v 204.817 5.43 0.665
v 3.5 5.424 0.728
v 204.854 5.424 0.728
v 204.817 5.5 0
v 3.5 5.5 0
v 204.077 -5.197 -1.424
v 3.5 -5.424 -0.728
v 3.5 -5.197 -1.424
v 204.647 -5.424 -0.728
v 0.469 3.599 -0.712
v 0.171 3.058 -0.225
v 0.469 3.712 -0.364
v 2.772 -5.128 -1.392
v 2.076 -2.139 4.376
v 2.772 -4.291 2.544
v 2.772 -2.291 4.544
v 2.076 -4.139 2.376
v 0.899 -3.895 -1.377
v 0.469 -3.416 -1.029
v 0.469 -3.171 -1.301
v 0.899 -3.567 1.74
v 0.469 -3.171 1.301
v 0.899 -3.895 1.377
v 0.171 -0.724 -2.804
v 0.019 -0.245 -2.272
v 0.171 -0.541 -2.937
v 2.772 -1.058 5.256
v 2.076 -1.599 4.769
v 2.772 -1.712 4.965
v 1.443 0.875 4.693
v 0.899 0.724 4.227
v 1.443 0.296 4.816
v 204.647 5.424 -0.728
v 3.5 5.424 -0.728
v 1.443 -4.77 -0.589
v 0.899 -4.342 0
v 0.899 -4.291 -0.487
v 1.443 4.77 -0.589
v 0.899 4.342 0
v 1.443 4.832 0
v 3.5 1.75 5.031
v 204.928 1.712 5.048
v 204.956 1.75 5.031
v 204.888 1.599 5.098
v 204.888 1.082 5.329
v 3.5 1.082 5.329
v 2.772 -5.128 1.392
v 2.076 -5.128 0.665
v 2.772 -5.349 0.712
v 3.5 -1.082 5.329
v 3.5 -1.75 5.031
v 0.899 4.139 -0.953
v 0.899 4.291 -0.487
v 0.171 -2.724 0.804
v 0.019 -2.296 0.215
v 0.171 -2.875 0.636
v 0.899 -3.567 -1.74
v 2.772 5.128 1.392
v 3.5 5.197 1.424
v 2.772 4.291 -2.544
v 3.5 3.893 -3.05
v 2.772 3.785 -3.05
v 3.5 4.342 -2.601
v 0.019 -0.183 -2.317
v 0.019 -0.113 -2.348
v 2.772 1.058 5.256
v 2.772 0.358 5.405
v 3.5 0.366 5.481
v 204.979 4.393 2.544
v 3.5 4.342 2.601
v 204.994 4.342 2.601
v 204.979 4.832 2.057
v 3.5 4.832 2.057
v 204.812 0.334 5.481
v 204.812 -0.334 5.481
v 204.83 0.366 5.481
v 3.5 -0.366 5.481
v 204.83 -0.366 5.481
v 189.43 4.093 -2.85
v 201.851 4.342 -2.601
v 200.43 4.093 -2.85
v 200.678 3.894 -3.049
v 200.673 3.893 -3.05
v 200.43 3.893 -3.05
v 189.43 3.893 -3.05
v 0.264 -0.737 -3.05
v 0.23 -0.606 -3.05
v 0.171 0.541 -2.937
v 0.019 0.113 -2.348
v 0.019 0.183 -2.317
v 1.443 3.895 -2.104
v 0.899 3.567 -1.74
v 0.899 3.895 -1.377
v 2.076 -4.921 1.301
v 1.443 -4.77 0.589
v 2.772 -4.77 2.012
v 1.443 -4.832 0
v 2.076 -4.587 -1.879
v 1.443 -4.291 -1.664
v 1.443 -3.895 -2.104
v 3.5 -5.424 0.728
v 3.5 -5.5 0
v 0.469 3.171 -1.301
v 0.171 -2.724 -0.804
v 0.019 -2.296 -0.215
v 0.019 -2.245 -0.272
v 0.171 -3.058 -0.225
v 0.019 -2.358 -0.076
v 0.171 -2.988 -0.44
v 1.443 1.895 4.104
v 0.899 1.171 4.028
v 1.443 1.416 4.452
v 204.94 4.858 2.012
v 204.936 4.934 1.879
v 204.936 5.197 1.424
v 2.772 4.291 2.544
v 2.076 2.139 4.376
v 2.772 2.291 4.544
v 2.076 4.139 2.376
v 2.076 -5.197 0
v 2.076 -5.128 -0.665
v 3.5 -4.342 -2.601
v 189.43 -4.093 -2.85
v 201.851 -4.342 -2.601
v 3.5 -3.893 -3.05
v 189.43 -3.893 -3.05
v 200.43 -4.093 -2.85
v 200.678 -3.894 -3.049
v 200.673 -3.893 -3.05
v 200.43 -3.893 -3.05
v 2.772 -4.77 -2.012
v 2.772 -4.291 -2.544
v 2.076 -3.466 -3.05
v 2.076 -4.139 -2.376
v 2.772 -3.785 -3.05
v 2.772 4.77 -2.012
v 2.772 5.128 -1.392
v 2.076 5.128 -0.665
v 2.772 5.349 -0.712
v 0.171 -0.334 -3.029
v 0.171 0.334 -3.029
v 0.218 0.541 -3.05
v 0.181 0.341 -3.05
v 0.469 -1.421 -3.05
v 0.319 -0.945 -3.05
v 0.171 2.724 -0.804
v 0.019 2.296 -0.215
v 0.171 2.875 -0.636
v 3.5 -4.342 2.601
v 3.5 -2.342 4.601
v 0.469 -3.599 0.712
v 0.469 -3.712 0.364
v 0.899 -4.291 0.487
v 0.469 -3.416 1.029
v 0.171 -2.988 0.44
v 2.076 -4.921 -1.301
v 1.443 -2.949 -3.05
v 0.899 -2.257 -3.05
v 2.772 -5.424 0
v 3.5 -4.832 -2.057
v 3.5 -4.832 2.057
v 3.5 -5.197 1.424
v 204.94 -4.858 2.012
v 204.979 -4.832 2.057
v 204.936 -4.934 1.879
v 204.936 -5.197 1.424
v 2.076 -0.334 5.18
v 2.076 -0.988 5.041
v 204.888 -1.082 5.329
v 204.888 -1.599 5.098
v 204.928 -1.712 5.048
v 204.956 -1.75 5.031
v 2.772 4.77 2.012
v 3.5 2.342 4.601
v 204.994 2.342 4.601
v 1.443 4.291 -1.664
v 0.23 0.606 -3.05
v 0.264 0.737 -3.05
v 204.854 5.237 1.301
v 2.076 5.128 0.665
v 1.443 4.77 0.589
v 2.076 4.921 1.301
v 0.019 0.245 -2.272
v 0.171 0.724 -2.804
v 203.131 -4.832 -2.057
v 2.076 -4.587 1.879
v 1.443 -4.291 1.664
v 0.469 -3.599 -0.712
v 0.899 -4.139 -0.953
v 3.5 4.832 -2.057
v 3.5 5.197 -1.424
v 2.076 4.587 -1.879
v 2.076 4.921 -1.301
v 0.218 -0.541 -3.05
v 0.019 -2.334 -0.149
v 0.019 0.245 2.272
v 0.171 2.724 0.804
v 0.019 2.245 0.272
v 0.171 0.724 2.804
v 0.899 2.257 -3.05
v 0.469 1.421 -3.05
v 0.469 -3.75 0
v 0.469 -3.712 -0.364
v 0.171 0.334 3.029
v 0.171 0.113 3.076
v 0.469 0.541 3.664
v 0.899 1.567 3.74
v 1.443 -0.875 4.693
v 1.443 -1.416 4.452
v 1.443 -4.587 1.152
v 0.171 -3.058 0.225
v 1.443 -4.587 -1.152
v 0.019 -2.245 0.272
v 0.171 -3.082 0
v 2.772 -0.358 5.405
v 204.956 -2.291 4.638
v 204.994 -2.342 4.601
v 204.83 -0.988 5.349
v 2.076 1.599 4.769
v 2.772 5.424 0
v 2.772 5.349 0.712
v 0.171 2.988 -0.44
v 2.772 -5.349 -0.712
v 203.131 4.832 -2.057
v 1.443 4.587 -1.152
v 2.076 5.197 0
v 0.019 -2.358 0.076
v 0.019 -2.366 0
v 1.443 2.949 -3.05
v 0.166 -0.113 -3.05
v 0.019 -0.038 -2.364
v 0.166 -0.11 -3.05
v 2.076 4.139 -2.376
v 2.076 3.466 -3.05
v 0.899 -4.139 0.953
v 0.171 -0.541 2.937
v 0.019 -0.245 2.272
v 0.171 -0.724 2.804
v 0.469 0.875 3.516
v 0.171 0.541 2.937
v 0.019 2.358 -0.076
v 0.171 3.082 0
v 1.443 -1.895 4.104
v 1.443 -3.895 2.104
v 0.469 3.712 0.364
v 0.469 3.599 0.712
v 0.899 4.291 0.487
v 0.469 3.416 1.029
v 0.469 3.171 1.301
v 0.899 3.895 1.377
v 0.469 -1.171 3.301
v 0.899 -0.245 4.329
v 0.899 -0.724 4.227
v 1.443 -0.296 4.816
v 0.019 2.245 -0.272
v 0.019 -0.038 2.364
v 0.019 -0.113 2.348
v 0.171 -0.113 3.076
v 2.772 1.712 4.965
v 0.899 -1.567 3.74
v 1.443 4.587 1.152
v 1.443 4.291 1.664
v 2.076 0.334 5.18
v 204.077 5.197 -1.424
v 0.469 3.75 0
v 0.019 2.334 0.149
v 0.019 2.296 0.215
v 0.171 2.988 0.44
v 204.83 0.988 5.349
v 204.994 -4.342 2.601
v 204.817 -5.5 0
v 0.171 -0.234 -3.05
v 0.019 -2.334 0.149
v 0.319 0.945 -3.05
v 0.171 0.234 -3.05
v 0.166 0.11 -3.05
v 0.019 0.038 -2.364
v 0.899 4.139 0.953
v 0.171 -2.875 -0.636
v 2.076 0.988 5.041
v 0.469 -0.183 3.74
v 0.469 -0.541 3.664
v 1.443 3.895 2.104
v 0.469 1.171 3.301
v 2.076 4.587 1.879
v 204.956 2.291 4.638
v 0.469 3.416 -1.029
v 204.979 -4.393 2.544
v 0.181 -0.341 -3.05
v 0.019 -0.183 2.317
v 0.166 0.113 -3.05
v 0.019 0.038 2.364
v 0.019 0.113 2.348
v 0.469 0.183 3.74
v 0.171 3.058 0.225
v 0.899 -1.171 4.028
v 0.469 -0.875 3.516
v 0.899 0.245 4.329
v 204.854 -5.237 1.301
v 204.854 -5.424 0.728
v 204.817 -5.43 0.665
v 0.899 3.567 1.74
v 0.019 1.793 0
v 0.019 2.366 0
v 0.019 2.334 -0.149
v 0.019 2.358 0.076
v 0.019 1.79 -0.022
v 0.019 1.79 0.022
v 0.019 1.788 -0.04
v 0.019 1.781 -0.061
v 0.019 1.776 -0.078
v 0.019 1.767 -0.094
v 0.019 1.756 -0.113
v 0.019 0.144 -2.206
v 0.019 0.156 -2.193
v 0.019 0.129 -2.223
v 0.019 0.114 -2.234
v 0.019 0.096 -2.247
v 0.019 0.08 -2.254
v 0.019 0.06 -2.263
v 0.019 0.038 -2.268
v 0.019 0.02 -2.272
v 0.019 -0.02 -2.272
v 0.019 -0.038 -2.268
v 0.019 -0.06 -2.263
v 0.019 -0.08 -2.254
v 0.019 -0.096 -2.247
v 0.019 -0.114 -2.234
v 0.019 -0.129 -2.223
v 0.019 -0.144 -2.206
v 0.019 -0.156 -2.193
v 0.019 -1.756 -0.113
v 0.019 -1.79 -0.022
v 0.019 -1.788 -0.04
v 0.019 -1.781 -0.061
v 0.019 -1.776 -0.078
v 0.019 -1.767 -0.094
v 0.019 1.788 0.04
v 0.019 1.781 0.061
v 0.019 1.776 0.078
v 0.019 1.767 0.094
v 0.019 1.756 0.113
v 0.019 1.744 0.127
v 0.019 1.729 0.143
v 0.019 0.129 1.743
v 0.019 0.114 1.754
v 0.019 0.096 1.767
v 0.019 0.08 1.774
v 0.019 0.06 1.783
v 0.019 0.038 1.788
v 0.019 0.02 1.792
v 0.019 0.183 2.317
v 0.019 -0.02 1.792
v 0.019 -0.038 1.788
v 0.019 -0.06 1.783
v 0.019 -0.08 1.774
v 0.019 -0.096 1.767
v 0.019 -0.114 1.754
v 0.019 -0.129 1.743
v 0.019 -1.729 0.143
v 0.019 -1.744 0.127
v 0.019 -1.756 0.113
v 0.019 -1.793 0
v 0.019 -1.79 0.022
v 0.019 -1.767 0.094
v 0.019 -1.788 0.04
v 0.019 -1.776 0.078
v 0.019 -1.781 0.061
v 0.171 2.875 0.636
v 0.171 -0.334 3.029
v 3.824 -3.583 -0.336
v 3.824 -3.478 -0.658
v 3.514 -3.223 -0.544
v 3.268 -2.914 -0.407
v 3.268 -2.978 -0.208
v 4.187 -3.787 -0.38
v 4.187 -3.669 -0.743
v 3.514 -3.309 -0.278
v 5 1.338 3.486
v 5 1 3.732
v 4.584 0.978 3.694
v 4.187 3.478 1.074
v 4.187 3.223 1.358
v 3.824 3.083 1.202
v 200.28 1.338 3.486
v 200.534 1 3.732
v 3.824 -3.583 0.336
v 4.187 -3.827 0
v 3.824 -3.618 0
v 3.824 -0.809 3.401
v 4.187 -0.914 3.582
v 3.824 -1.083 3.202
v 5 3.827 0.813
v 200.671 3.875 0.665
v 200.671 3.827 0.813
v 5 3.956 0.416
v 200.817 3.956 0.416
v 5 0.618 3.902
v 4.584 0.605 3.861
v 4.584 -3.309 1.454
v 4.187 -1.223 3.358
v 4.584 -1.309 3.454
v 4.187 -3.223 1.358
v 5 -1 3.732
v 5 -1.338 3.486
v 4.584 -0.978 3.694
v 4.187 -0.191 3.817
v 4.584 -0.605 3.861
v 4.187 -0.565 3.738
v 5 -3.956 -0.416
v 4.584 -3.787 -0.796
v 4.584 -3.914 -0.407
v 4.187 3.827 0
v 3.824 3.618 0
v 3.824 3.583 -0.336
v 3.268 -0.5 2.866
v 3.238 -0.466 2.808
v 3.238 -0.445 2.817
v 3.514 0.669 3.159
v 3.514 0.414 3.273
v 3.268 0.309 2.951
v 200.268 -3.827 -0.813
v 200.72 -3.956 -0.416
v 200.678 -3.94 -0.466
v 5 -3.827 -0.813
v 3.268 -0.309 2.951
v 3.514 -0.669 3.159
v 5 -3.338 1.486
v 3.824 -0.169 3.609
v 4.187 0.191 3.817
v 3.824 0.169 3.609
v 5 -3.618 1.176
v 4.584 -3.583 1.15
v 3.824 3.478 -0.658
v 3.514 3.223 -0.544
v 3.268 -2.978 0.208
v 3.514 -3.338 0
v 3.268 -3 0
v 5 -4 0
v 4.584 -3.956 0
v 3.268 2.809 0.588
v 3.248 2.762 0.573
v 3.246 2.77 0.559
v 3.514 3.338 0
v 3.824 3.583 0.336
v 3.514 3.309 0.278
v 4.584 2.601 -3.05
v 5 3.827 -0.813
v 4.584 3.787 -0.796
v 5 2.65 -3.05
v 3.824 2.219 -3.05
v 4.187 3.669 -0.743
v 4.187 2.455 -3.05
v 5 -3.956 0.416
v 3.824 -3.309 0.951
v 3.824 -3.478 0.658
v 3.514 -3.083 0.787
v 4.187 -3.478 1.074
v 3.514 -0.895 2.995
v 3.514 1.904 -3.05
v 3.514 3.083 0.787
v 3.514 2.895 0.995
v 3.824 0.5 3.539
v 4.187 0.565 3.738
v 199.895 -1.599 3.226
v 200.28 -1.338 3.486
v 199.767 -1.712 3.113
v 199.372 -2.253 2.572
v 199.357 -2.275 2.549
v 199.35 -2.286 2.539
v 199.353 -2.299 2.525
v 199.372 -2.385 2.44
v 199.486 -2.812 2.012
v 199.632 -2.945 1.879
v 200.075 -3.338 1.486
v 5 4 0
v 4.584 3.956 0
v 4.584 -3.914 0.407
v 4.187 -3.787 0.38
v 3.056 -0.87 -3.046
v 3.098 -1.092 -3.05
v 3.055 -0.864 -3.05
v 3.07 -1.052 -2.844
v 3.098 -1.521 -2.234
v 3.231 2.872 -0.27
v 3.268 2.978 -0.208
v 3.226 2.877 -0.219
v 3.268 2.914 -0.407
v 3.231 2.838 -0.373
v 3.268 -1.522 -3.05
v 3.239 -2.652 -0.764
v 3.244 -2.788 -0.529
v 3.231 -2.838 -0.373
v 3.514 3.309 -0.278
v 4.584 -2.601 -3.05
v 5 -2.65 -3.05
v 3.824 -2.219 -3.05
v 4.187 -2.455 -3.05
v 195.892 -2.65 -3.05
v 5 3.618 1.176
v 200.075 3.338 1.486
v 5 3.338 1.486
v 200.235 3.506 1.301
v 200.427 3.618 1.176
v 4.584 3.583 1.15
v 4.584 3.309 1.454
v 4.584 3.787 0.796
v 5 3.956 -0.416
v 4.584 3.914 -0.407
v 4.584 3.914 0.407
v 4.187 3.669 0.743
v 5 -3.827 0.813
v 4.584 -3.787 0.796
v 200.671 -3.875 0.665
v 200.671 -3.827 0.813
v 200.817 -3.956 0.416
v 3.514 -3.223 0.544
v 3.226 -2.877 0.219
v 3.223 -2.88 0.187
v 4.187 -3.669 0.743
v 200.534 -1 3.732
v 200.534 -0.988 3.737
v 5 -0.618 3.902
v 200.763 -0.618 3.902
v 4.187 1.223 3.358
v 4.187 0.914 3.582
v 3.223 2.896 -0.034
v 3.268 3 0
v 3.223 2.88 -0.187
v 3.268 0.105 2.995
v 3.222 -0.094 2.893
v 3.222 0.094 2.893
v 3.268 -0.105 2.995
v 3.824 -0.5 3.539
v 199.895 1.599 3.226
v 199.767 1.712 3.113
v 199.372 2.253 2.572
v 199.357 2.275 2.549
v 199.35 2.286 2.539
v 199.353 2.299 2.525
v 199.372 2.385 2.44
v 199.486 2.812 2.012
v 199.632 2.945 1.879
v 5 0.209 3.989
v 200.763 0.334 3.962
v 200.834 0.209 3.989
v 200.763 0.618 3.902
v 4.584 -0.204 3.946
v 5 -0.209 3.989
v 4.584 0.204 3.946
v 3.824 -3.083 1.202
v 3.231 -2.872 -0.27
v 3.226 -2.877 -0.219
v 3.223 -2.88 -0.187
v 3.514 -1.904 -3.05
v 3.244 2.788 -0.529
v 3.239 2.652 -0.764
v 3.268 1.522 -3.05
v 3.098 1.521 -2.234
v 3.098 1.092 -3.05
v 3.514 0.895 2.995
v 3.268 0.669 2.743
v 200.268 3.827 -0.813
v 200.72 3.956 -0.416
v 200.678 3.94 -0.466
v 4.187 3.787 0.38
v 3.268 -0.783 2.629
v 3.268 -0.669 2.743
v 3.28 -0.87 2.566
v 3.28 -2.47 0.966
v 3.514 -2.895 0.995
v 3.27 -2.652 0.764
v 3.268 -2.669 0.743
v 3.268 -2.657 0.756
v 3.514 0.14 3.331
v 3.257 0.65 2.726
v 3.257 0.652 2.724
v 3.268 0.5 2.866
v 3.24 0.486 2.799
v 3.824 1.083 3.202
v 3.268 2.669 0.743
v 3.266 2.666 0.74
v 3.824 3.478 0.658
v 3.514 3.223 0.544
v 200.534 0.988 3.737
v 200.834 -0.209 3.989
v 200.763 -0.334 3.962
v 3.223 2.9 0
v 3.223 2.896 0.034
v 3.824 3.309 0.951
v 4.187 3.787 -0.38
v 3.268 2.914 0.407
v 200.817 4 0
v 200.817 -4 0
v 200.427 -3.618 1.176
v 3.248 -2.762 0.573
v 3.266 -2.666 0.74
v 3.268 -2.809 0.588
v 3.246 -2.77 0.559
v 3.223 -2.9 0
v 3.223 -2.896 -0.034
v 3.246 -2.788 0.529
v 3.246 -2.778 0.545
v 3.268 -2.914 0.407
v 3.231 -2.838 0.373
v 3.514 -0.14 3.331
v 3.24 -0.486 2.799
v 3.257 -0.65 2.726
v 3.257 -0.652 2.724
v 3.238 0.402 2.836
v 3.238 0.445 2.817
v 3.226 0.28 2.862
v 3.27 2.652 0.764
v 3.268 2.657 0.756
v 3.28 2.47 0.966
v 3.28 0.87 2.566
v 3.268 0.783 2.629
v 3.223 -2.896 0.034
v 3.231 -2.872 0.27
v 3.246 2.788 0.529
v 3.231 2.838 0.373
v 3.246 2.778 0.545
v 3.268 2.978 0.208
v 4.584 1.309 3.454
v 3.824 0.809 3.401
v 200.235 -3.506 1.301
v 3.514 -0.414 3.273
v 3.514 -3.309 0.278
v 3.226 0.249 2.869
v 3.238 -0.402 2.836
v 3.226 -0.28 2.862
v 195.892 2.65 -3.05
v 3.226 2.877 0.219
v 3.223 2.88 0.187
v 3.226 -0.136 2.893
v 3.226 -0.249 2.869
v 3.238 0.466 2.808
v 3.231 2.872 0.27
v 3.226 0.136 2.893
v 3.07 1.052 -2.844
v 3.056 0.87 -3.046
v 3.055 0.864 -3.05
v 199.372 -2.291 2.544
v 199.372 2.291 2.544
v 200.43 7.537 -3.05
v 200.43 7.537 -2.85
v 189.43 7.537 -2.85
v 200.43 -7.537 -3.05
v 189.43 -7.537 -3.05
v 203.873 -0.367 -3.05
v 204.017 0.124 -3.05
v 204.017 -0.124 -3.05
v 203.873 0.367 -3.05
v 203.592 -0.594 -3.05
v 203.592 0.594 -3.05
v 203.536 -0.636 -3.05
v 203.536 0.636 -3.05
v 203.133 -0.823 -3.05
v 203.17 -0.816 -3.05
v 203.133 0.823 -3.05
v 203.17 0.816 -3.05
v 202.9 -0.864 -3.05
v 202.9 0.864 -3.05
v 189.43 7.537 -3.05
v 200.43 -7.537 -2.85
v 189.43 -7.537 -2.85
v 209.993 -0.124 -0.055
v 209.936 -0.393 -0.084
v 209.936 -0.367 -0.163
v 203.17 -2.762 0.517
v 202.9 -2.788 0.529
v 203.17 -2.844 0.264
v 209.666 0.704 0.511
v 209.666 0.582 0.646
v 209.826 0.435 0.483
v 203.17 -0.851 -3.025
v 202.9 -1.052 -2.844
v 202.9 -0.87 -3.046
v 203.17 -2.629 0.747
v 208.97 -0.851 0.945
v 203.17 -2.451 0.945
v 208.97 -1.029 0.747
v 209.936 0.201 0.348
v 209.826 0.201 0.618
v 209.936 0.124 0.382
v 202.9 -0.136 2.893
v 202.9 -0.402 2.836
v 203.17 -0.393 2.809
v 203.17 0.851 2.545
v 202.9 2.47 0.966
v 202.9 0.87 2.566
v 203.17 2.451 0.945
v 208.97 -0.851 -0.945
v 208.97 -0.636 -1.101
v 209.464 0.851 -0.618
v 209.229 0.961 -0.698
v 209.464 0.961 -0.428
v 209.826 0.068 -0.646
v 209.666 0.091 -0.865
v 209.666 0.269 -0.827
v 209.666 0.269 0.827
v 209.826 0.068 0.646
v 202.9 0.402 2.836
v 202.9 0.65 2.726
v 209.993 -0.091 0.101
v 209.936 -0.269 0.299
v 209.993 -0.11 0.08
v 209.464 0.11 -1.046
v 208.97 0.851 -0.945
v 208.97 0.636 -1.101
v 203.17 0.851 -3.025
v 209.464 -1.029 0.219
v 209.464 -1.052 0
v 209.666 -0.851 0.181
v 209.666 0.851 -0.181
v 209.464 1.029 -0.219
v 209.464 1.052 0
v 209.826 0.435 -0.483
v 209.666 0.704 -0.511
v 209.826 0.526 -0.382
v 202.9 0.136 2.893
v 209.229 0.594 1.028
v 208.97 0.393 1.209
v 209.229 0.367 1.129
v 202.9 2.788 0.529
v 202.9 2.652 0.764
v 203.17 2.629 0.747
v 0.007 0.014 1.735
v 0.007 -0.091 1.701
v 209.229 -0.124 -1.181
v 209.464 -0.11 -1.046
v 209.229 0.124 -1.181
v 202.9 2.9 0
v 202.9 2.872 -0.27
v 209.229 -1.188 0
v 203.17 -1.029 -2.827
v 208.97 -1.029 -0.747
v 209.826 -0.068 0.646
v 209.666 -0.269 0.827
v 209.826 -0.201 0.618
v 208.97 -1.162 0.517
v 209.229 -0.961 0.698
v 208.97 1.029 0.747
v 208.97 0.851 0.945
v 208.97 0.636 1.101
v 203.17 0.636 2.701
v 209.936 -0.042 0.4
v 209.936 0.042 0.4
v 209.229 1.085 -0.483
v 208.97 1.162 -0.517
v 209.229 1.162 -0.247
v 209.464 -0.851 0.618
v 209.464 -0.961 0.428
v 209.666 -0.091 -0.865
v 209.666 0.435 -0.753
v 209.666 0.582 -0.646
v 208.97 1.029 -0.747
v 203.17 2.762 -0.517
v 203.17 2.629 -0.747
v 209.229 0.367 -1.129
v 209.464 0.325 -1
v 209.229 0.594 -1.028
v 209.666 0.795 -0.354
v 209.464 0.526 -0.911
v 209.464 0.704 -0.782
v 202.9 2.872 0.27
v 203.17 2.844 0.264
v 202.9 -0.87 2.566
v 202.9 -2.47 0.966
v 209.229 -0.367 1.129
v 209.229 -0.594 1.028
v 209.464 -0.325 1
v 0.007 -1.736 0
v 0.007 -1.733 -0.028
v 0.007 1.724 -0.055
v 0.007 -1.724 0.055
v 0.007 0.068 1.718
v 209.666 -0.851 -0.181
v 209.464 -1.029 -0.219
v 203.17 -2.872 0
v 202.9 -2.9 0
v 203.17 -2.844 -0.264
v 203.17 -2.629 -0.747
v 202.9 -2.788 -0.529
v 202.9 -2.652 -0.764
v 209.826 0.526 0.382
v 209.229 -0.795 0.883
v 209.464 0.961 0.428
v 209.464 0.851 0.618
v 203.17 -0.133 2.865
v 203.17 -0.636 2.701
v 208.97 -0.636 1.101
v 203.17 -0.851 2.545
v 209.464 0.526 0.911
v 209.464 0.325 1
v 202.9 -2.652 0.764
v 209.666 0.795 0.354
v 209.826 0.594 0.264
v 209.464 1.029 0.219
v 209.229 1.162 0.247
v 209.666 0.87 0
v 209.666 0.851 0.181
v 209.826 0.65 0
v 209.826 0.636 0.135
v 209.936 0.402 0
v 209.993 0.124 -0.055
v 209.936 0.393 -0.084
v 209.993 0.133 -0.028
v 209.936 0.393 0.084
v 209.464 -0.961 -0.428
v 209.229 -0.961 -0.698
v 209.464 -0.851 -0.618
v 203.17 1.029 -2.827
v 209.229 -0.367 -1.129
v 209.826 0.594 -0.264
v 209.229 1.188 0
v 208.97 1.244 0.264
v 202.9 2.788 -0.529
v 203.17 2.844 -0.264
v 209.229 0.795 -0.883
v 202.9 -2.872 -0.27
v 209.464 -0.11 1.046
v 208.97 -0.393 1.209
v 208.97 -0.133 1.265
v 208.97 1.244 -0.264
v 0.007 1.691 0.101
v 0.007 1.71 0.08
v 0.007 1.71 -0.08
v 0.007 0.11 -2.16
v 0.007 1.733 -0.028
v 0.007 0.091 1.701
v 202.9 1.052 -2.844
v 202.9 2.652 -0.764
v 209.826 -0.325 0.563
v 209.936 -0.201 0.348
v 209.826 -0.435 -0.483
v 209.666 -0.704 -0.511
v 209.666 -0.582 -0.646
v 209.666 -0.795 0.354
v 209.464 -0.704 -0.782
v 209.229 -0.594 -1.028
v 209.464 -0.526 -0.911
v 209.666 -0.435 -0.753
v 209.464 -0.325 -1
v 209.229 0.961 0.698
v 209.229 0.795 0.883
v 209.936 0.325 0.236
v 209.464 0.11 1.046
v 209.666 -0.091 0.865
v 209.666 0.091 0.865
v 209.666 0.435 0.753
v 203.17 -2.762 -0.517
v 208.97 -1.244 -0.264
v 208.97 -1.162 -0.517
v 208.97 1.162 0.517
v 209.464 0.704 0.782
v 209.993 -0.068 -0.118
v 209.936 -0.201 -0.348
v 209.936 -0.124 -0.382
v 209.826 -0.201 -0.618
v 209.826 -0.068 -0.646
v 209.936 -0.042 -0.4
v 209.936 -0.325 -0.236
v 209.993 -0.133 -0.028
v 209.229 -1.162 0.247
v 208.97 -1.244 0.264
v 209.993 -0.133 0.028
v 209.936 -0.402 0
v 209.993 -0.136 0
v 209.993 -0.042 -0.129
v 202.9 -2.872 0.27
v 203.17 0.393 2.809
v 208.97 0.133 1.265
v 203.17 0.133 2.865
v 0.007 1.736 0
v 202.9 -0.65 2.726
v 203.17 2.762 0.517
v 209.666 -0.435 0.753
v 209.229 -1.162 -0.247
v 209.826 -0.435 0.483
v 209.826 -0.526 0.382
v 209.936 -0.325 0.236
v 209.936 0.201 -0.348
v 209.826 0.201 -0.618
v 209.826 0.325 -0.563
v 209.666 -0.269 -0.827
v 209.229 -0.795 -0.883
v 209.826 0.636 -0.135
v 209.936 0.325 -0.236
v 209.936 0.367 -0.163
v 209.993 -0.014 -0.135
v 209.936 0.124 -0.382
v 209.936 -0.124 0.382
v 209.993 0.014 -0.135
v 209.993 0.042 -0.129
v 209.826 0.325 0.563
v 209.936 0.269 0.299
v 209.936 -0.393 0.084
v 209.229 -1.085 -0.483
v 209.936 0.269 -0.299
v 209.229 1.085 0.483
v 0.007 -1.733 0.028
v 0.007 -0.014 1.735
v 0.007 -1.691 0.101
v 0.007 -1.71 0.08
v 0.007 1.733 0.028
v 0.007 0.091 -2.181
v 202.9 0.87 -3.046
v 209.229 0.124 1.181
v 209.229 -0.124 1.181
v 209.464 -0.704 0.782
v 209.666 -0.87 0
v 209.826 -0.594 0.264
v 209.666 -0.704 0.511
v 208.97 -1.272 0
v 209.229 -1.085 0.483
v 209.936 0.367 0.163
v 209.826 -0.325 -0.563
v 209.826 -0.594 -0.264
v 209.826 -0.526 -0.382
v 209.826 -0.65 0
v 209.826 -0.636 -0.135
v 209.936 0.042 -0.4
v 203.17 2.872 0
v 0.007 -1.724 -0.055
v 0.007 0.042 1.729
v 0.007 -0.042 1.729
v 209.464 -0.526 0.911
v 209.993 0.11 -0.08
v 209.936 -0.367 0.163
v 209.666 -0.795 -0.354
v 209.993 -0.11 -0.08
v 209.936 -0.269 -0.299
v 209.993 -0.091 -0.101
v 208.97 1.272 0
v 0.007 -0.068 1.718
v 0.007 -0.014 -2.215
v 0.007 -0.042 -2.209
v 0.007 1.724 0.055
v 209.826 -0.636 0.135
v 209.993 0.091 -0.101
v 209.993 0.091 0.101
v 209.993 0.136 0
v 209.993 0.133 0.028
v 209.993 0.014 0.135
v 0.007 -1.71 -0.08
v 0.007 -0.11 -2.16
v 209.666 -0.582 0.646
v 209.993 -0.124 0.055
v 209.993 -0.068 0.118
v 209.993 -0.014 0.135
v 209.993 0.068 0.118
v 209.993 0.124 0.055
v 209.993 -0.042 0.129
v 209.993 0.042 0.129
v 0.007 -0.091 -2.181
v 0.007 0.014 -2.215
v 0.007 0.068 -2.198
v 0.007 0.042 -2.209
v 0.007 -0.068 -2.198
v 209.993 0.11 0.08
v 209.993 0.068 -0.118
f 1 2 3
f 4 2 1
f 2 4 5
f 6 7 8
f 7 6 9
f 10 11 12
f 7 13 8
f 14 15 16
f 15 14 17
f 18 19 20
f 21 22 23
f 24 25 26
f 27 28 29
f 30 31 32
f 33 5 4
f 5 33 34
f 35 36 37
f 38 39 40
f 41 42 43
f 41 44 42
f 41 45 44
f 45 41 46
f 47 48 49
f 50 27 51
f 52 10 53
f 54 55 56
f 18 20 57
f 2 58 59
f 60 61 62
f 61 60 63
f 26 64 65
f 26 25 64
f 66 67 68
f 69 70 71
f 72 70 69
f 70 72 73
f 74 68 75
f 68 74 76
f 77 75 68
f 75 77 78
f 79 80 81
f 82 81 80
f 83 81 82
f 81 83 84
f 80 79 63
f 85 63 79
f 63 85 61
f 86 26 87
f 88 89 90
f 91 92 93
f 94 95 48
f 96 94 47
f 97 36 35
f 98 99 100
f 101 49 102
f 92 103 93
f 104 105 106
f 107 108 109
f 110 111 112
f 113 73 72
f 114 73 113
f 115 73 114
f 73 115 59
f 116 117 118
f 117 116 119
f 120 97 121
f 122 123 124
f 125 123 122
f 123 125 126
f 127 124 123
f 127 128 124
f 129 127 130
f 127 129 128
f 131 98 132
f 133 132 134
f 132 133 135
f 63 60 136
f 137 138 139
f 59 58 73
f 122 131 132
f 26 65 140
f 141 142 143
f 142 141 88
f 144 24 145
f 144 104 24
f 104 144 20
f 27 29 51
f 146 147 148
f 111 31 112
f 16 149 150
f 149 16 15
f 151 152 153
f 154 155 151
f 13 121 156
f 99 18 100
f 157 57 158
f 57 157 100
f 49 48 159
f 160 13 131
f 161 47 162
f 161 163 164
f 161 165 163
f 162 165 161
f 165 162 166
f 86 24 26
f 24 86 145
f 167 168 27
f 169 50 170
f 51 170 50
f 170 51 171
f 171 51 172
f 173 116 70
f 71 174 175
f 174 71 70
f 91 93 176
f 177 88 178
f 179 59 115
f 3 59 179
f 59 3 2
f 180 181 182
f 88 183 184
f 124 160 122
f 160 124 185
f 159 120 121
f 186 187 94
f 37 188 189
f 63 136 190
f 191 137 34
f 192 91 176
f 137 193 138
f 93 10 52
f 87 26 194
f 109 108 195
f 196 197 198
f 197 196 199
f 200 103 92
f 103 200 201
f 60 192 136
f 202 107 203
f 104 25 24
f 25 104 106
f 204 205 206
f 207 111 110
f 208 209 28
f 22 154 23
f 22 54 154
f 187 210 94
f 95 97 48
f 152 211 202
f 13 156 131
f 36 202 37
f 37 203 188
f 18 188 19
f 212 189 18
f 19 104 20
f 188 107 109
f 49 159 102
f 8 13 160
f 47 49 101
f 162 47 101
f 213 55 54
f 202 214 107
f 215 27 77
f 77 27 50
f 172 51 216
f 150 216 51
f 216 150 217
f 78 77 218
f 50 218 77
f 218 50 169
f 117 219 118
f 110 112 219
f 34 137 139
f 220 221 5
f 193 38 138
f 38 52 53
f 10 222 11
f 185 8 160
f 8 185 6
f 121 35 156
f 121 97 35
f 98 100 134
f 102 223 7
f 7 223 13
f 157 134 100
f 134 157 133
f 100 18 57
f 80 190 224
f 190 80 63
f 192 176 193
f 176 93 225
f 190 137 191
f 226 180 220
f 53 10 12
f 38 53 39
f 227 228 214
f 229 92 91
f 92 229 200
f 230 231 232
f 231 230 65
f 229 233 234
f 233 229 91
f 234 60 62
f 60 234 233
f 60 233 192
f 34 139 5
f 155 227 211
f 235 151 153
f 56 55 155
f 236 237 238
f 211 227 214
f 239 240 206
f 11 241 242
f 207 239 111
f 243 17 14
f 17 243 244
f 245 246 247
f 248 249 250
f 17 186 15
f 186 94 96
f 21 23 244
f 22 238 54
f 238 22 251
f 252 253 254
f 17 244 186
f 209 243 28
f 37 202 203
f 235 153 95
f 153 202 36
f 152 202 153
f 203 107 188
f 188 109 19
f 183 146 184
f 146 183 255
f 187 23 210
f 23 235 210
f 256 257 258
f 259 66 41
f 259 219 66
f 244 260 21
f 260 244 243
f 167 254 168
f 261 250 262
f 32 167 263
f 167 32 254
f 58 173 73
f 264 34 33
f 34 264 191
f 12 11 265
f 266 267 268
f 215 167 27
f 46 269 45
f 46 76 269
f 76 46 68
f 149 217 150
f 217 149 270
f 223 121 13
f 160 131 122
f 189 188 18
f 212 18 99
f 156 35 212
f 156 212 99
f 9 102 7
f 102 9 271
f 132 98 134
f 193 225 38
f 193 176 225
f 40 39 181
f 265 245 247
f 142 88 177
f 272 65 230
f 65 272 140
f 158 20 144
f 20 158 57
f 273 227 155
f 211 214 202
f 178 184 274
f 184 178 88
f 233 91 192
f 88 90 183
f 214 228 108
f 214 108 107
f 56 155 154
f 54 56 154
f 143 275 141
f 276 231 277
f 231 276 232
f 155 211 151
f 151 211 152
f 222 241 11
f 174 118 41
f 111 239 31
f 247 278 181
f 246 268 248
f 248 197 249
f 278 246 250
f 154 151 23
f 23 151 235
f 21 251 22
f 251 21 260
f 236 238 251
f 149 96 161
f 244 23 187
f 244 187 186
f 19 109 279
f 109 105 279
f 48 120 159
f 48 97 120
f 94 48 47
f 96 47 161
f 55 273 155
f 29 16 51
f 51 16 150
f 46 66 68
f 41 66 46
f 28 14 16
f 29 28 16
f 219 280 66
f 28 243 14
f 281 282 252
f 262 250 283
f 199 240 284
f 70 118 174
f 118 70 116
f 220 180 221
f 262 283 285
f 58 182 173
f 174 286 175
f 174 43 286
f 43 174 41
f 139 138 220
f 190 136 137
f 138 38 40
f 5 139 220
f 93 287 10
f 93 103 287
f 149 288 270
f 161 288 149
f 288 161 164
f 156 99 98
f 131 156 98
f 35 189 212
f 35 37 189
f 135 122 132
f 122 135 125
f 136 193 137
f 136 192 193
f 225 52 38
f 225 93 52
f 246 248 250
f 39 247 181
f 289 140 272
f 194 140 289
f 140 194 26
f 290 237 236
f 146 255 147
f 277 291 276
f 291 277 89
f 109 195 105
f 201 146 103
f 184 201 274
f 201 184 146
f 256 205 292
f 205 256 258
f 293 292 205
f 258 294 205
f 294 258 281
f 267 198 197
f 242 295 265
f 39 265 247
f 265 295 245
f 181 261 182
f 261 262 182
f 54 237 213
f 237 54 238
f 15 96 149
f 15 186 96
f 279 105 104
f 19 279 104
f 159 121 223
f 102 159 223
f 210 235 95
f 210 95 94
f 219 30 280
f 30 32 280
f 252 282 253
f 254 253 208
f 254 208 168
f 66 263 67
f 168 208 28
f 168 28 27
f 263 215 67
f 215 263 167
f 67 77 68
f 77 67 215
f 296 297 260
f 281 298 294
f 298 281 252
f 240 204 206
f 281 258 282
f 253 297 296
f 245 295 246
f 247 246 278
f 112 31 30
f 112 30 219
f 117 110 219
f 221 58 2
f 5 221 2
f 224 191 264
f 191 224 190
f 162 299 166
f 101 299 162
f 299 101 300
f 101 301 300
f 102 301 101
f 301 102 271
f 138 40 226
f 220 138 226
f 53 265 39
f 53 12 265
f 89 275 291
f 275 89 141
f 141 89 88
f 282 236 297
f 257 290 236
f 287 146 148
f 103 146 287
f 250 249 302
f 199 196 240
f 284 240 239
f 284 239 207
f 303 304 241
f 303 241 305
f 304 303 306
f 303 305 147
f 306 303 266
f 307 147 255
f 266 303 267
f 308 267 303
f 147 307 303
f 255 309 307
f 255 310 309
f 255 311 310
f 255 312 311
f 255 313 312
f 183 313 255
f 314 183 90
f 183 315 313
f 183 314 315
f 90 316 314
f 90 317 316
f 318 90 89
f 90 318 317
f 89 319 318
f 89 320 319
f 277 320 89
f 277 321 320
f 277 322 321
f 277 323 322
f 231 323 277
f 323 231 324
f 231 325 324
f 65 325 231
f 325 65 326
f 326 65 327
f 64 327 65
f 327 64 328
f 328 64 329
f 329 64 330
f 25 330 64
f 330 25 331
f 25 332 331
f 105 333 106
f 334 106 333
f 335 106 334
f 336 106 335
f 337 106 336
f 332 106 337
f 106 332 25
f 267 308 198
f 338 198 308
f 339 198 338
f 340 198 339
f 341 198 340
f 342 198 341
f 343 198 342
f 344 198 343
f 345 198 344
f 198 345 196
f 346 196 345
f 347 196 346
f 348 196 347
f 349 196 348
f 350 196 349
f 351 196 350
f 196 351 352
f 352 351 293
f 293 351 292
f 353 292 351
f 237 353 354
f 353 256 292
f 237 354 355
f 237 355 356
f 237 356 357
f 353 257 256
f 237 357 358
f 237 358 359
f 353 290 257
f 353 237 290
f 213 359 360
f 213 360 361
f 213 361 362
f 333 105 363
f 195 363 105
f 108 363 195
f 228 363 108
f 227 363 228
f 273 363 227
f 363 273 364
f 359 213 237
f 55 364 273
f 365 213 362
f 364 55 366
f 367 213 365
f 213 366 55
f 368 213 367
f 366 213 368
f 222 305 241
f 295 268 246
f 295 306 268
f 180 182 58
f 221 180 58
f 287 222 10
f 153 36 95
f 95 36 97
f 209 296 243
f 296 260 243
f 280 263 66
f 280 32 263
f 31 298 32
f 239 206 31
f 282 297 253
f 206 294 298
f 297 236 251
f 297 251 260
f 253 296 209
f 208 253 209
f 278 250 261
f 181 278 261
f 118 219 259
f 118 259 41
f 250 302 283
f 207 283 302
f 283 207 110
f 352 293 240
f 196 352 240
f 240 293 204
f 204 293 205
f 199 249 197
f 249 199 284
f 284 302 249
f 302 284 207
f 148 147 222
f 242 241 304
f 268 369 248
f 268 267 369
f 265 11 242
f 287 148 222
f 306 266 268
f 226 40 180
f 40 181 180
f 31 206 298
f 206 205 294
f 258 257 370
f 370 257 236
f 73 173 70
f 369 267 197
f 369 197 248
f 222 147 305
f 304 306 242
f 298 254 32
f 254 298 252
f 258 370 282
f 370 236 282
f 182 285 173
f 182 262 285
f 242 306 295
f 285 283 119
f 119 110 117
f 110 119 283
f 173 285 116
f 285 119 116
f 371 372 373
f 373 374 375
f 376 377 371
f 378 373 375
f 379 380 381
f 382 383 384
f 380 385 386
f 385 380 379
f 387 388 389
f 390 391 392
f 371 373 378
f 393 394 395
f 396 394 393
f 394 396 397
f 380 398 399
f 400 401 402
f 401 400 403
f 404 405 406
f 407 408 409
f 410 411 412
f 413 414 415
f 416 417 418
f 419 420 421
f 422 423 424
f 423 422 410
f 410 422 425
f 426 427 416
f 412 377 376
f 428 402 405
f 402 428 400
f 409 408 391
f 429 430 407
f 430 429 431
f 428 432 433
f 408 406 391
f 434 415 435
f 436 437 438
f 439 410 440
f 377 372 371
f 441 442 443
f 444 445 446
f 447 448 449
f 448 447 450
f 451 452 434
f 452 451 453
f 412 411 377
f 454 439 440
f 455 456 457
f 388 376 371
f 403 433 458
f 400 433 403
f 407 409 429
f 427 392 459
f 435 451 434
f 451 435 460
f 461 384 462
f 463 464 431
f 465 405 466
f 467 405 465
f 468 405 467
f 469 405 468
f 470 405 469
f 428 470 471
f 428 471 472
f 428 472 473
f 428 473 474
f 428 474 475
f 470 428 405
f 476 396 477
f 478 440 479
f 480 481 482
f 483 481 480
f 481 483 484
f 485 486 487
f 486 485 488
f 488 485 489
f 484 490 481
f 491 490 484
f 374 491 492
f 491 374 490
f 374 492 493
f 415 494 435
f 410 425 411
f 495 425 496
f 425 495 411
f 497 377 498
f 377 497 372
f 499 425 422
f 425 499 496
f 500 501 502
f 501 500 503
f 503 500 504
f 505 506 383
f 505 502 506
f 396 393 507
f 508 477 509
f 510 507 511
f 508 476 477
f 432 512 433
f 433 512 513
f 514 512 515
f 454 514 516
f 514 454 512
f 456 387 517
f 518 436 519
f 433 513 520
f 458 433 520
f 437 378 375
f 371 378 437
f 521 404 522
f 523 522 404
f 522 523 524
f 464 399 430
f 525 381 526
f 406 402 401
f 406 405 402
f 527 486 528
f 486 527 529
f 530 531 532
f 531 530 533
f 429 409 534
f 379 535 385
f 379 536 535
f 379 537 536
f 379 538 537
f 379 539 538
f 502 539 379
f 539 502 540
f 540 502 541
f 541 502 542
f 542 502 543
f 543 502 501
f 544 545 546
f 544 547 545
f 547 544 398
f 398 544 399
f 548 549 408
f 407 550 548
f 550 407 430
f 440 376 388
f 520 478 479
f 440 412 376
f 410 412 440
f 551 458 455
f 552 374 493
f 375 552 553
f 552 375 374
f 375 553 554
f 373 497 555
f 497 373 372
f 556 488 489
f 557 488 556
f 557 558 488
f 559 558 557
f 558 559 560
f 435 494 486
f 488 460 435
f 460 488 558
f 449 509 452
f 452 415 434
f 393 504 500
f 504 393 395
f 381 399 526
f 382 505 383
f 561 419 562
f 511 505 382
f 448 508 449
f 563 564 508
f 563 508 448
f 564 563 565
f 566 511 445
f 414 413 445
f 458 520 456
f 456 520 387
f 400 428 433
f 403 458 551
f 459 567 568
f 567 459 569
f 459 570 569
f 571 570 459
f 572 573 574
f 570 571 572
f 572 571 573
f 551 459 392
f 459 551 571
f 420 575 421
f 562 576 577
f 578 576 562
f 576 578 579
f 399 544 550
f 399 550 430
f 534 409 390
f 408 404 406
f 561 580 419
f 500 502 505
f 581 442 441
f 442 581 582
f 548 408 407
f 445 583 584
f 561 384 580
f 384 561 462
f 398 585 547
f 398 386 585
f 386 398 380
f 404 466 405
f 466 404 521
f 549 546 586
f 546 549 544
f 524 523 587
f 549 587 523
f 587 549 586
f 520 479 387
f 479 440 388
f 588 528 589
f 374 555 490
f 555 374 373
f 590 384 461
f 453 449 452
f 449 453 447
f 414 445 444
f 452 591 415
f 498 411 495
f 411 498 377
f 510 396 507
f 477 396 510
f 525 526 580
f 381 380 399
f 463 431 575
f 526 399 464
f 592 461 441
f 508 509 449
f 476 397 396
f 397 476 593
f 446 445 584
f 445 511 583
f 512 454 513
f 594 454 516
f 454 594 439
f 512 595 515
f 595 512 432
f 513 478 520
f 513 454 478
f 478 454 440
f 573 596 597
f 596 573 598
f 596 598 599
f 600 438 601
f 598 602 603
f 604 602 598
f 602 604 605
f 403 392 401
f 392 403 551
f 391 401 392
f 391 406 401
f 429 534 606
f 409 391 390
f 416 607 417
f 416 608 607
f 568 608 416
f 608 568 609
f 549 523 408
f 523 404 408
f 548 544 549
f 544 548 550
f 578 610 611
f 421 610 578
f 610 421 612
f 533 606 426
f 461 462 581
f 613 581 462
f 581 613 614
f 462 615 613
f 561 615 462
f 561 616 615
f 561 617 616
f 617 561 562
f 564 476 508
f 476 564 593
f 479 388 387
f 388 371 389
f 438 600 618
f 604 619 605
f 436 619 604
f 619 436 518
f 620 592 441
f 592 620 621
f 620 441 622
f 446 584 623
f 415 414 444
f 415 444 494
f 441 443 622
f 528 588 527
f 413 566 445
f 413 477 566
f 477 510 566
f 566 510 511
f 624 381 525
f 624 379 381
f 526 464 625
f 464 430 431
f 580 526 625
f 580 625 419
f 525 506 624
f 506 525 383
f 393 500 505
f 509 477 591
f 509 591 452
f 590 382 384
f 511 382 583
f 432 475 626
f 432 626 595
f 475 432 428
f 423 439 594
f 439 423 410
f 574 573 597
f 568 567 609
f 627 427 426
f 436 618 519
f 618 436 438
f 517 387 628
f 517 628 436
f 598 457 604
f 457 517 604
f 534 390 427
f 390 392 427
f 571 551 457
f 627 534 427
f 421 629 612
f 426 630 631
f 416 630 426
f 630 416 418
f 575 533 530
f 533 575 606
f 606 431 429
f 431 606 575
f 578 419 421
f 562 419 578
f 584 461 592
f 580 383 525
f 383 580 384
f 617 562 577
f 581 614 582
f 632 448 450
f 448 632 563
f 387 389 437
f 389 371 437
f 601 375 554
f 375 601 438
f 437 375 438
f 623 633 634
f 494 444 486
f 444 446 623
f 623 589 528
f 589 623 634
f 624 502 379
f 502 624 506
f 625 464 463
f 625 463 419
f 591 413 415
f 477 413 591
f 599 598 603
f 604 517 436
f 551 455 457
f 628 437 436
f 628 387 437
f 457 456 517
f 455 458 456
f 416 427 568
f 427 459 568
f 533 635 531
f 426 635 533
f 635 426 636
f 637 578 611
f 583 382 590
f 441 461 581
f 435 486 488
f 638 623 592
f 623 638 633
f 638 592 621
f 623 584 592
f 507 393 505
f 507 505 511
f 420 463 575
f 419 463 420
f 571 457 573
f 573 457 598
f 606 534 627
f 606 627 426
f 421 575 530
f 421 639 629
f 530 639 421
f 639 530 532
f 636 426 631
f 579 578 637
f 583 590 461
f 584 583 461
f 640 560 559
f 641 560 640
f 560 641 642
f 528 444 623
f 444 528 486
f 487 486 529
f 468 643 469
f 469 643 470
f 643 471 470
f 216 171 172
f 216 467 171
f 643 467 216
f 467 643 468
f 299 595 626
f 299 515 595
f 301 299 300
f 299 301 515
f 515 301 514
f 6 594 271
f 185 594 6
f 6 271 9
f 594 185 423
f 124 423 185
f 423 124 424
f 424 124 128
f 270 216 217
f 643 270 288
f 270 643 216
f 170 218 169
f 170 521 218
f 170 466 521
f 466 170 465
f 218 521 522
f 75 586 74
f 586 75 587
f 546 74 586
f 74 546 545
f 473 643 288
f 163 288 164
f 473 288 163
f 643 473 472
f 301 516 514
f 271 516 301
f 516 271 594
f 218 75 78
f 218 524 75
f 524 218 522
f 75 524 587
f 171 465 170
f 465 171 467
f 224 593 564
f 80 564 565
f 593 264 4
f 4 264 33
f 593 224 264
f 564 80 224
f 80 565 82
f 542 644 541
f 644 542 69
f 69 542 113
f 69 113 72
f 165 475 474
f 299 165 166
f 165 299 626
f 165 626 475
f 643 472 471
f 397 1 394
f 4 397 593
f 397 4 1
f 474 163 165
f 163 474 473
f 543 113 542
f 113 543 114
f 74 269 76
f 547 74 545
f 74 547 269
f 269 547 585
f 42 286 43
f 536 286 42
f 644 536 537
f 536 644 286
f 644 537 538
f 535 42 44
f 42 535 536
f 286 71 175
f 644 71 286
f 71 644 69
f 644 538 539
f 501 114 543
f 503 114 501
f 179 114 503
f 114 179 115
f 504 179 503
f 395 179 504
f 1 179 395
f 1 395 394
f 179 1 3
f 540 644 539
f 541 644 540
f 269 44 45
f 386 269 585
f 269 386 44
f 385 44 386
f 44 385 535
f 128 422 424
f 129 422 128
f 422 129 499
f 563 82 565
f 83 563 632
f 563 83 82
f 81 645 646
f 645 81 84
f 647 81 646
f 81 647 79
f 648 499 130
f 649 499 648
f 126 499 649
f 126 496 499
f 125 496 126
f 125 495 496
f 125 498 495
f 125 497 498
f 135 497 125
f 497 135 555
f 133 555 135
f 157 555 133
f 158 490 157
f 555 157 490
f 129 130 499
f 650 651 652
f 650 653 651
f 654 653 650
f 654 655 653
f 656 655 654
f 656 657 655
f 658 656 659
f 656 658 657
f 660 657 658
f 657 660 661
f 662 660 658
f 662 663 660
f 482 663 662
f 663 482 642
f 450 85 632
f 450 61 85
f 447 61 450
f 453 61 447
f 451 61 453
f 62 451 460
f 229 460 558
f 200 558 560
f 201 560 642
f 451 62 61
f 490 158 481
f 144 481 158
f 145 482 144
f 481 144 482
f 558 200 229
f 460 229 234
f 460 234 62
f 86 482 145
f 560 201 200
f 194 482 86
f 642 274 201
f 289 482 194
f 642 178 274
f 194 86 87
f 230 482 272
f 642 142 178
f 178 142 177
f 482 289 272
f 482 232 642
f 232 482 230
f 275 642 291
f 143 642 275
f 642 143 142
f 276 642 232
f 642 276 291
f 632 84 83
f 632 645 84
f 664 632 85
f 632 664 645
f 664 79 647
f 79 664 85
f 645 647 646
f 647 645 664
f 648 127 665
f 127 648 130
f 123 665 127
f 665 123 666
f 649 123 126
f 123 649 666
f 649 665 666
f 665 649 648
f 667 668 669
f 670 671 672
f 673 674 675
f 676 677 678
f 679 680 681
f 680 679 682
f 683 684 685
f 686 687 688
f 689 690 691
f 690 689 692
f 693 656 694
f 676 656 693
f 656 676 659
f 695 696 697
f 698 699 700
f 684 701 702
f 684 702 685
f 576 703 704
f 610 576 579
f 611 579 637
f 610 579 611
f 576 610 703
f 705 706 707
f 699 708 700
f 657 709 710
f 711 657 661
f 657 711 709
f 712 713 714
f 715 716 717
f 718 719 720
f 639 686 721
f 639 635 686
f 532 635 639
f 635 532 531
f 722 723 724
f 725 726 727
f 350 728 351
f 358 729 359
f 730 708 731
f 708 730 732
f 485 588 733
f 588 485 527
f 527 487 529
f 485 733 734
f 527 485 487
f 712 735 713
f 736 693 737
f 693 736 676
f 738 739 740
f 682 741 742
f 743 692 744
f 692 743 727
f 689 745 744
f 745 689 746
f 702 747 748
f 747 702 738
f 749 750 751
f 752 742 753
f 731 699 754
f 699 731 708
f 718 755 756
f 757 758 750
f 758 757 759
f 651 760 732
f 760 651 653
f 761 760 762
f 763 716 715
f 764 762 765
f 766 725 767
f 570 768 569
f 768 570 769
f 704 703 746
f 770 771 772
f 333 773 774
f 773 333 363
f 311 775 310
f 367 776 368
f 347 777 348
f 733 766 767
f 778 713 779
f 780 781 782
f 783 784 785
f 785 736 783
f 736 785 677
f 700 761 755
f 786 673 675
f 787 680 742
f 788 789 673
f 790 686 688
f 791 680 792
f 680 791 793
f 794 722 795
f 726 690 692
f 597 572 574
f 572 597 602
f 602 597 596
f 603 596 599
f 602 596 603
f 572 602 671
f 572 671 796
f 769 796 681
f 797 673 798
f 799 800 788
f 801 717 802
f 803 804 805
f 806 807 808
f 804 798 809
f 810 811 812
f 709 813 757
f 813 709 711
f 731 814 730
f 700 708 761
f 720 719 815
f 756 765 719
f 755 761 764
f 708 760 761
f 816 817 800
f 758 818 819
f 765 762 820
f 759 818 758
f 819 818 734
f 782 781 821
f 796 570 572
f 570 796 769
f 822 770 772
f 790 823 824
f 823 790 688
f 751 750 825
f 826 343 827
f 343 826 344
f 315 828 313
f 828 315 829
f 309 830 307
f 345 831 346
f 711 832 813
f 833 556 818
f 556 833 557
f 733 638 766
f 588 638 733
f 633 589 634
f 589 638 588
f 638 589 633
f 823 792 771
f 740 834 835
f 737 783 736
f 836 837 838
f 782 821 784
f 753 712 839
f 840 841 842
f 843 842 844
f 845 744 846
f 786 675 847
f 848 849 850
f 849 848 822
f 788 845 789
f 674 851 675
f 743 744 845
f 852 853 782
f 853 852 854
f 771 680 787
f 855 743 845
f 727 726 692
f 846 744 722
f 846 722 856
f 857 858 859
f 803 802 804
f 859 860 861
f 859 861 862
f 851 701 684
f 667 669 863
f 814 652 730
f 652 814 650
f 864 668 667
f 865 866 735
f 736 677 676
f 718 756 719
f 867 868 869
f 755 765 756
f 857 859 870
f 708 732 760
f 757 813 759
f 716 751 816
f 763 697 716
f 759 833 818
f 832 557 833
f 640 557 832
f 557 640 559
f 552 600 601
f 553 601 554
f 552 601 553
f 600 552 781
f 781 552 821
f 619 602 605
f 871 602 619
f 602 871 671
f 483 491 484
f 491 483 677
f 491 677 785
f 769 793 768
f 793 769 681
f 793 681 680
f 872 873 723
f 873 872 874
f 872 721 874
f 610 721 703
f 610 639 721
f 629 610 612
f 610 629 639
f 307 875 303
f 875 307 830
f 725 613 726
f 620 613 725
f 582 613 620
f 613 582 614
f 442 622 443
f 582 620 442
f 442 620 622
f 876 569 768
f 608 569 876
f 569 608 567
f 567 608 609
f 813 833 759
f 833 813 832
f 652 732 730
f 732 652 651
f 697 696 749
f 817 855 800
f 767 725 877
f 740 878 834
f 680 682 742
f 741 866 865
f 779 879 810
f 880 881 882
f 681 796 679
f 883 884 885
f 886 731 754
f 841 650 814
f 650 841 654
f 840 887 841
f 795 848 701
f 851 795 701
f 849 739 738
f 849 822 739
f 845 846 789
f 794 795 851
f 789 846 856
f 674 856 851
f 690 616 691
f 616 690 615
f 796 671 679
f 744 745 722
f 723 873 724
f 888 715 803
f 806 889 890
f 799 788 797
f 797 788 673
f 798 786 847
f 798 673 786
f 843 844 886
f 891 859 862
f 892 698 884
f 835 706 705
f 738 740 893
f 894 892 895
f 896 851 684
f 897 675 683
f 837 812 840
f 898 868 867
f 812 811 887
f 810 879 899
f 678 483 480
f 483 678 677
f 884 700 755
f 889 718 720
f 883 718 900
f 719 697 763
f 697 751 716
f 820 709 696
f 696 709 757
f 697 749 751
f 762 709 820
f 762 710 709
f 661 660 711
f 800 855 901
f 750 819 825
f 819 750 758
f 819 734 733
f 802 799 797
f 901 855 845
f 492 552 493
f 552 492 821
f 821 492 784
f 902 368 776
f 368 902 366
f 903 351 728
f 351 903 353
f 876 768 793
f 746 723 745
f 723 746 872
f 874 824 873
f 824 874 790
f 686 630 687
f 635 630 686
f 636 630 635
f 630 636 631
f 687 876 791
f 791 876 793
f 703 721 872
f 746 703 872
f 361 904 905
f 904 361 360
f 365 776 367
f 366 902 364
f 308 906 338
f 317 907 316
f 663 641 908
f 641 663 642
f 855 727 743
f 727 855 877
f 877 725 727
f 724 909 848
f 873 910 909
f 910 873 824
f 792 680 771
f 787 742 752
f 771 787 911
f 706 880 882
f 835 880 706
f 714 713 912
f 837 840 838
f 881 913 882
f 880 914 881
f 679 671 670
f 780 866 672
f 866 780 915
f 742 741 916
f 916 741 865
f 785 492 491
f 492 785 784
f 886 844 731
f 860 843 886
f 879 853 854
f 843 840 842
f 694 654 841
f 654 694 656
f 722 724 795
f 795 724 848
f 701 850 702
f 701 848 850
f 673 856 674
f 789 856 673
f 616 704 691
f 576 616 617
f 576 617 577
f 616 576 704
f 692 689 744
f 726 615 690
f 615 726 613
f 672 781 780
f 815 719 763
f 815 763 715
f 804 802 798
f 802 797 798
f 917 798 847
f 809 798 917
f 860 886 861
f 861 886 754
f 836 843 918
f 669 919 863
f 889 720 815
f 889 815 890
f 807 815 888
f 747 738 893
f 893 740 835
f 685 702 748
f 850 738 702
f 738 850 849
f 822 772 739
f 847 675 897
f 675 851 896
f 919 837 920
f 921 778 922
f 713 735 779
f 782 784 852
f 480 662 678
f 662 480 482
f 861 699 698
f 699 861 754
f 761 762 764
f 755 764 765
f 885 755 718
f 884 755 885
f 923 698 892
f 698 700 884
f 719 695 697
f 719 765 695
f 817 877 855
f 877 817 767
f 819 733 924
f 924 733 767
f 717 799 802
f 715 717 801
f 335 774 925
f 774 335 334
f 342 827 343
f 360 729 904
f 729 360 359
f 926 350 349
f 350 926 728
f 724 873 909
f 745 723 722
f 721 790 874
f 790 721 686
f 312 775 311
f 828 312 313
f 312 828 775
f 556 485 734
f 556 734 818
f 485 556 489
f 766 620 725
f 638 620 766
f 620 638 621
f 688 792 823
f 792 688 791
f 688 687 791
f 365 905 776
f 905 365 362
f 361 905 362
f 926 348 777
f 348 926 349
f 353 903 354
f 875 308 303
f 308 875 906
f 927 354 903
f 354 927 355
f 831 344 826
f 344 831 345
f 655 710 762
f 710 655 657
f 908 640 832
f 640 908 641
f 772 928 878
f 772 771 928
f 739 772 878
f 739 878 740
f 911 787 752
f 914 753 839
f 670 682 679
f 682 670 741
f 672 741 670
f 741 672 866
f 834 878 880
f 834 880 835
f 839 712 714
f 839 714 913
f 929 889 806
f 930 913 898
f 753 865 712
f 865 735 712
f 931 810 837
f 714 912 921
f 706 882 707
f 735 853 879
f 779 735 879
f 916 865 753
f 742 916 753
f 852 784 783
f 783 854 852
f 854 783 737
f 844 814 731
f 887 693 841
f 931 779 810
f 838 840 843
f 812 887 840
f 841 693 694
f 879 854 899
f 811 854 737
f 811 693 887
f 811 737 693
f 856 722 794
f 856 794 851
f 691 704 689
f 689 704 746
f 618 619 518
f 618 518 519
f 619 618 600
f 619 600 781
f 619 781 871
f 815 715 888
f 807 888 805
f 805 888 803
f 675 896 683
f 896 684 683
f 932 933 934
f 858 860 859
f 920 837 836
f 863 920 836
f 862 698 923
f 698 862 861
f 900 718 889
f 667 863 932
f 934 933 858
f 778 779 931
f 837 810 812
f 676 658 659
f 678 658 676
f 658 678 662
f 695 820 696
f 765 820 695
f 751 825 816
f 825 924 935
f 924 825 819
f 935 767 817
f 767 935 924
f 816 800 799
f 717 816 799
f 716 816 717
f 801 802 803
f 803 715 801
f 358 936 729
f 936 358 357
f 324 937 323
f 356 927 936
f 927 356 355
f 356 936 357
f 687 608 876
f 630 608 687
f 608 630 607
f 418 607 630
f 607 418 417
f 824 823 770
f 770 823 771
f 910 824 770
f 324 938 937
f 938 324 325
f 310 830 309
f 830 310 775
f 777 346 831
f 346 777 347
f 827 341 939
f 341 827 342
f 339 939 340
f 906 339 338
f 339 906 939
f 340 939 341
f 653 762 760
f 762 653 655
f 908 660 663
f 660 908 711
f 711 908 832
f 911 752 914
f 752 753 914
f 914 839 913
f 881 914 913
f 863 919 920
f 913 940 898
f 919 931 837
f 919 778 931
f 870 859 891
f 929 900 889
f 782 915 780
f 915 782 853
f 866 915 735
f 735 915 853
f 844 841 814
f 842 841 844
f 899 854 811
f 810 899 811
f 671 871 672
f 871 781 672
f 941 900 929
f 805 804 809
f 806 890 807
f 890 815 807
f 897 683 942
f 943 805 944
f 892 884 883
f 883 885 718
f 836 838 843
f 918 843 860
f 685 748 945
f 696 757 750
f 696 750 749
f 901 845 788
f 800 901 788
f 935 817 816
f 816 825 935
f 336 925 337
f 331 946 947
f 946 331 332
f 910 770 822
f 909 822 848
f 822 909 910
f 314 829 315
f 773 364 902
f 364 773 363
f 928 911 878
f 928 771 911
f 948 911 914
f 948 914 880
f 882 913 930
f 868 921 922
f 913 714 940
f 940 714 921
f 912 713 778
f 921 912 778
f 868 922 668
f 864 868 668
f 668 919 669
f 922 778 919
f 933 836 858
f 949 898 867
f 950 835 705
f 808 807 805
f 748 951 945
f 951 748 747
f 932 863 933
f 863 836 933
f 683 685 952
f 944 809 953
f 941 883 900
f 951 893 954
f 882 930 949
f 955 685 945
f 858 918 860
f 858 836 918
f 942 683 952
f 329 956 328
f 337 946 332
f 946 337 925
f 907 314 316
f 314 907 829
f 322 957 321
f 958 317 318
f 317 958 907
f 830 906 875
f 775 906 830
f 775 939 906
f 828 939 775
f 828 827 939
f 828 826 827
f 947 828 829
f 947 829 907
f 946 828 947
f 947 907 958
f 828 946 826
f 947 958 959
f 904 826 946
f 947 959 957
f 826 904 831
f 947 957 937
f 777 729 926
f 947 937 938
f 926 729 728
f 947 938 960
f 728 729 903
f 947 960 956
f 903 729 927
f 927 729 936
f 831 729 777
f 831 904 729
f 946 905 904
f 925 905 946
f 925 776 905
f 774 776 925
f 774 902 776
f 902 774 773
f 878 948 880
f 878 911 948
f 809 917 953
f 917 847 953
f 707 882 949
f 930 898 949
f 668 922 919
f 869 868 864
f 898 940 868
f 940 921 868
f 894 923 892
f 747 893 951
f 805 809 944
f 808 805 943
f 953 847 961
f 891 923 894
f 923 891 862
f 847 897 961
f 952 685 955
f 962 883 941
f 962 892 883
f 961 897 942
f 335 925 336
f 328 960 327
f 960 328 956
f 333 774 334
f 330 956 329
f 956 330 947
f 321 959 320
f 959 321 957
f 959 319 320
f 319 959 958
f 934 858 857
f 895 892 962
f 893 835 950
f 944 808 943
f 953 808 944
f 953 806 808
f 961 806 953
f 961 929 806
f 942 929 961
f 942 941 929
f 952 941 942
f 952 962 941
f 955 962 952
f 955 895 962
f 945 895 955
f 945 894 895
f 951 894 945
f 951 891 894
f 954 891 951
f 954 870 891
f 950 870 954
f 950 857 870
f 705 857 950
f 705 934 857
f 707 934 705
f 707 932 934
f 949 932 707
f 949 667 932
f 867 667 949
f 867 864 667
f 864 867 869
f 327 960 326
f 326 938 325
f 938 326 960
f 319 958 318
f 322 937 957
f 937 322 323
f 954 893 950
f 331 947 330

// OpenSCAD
/*

Esto hay que imprimirlo con material de soporte
Está pensado así!

*/

module square_rod(length, width, point, skew = 0) {
    height = length - point;
    union() {
        linear_extrude(height = height)
            polygon(points = [[width, 0], [0, width], [-width, 0], [0, (1 + skew)*(-width)]]);
        translate([0, 0, height])
            linear_extrude(height = point, scale = 0)
                polygon(points = [[width, 0], [0, width], [-width, 0], [0, (1 + skew)*(-width)]]);
    }
}

module rod(length, width, radius, point = 0, skew = 0) {
    w = width/2 - radius;
    
    translate([radius, 0, 0]) 
    rotate([0, 0, 90])
    rotate([90, 0, 0])
    minkowski() {
        sphere(r = radius, $fn = 30);
        square_rod(length - radius*2, w, point, skew);
    }
}

module hollow_rod(length, width, radius, thickness, skew) {
    difference() {
        rod(length + radius, width, radius, skew);
        translate([thickness*2, 0, 0]) 
            rod(length + radius, width - thickness*2, radius - thickness, 0, skew*3);
        translate([length - radius + 0.1, 0, 0])
            rotate([0, 0, 180])
                rod(6, width + 2, radius, 8, skew + 55.5);
       translate([length - radius - 10, 0, -0.1])
            rotate([0, 0, 180])
                rod(7, width + 2, 0, 25, skew + 55.5);
    }
}

module clip(length, width, radius, thickness, space, skew = 0) {
   outer_width = width;
   inner_width = width - space*2 - thickness*2;
   inner_radius = radius - thickness - space;
   zcut = (width/2 + skew*3.5 - thickness - space - inner_radius);
   support_size = 0.2;
   
   module stickers() {
      thickness = 0.2;
      separation = 3.87;
      translate([length - width*1.87, separation, -zcut])
         cube([width, width/3, thickness]);
      translate([length - width*1.87, -separation - width/3, -zcut])
         cube([width, width/3, thickness]);
   }

   difference() {
      union() {
         hollow_rod(length - 4, outer_width, radius, thickness, skew);
         rod(length, inner_width, radius - space*2, inner_width, skew);
         stickers();
      }
      translate([-1, -width, - width - zcut])
         cube([length + width*2, width*2, width]);
   }
}

clip(
    length = 210,
    width = 11.0,
    radius = 3.5,
    thickness = 1.5,
    space = 1.1,
    skew = 0.3
);
